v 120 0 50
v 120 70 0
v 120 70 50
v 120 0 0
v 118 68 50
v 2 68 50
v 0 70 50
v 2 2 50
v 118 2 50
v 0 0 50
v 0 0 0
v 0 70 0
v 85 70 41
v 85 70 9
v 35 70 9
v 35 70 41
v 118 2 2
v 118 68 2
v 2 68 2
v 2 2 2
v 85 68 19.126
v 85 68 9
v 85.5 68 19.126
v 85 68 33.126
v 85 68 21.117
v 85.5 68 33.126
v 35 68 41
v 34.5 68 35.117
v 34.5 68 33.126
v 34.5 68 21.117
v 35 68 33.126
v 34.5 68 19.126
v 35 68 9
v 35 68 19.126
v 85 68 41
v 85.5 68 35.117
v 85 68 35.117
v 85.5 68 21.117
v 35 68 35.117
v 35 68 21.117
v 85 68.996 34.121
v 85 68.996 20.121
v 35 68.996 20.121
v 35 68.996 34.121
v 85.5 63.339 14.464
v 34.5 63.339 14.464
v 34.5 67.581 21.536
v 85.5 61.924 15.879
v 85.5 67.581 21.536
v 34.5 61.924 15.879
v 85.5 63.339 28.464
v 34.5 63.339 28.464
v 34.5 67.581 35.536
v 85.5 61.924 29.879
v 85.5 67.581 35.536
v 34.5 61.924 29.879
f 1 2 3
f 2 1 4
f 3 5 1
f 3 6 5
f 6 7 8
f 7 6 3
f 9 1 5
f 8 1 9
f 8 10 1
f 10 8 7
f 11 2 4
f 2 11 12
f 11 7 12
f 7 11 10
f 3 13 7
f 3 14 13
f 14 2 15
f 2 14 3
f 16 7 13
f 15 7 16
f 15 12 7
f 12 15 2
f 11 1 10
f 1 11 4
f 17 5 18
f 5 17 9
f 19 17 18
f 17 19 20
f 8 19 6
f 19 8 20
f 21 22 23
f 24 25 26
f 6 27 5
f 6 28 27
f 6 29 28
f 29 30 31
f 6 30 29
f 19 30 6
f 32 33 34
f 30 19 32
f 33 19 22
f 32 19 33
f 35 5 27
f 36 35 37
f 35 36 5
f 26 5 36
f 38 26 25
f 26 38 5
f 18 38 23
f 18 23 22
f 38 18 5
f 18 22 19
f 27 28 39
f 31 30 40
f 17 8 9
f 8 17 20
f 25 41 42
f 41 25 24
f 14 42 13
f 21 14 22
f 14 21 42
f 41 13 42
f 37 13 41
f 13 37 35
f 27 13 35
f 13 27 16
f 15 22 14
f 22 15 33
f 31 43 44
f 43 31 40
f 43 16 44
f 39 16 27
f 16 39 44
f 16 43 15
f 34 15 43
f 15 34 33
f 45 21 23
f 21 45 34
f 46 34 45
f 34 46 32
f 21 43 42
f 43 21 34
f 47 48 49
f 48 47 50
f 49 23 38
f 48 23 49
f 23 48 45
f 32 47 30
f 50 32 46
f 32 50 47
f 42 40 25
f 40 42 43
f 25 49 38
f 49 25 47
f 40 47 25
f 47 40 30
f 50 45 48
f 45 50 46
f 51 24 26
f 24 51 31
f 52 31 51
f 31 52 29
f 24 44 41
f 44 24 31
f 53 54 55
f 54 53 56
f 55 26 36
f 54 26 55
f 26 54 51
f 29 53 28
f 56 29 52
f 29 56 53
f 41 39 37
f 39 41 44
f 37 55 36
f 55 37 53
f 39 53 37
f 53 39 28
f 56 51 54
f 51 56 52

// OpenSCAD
$fn = 32;

// ----------------------------------------------------------------------
// Vent box: louvers enclosure
// ----------------------------------------------------------------------

// --- parameters (mm) ---
box_l = 120;              // box length, X
box_w = 70;               // box width, Y
box_h = 50;               // box height, Z
wall_t = 2;               // shell wall thickness
win_l = 50;               // vent window width, X
win_h = 32;               // vent window height, Z
slat_t = 2;               // louver slat thickness
slat_d = 8;               // louver slat depth
slat_a = 45;              // louver slat angle, degrees
slat_pitch = 14;          // louver pitch
slat_yc = 65.46;          // slat centreline Y

win_z0 = (box_h - win_h) / 2;  // window lower edge Z
n_slats = 2;  // louver count
slat_z0 = win_z0 + (win_h - (n_slats - 1) * slat_pitch) / 2;

difference() {
  union() {
    difference() {
      cube([box_l, box_w, box_h]);
  translate([wall_t, wall_t, wall_t])
    cube([box_l - 2 * wall_t, box_w - 2 * wall_t, box_h]);
  translate([(box_l - win_l) / 2, box_w - wall_t - 1, win_z0])
    cube([win_l, wall_t + 2, win_h]);
    }
    for (i = [0 : n_slats - 1])
      translate([box_l / 2, slat_yc, slat_z0 + i * slat_pitch])
        rotate([slat_a, 0, 0])
          cube([win_l + 1, slat_d, slat_t], center = true);
  }
}
